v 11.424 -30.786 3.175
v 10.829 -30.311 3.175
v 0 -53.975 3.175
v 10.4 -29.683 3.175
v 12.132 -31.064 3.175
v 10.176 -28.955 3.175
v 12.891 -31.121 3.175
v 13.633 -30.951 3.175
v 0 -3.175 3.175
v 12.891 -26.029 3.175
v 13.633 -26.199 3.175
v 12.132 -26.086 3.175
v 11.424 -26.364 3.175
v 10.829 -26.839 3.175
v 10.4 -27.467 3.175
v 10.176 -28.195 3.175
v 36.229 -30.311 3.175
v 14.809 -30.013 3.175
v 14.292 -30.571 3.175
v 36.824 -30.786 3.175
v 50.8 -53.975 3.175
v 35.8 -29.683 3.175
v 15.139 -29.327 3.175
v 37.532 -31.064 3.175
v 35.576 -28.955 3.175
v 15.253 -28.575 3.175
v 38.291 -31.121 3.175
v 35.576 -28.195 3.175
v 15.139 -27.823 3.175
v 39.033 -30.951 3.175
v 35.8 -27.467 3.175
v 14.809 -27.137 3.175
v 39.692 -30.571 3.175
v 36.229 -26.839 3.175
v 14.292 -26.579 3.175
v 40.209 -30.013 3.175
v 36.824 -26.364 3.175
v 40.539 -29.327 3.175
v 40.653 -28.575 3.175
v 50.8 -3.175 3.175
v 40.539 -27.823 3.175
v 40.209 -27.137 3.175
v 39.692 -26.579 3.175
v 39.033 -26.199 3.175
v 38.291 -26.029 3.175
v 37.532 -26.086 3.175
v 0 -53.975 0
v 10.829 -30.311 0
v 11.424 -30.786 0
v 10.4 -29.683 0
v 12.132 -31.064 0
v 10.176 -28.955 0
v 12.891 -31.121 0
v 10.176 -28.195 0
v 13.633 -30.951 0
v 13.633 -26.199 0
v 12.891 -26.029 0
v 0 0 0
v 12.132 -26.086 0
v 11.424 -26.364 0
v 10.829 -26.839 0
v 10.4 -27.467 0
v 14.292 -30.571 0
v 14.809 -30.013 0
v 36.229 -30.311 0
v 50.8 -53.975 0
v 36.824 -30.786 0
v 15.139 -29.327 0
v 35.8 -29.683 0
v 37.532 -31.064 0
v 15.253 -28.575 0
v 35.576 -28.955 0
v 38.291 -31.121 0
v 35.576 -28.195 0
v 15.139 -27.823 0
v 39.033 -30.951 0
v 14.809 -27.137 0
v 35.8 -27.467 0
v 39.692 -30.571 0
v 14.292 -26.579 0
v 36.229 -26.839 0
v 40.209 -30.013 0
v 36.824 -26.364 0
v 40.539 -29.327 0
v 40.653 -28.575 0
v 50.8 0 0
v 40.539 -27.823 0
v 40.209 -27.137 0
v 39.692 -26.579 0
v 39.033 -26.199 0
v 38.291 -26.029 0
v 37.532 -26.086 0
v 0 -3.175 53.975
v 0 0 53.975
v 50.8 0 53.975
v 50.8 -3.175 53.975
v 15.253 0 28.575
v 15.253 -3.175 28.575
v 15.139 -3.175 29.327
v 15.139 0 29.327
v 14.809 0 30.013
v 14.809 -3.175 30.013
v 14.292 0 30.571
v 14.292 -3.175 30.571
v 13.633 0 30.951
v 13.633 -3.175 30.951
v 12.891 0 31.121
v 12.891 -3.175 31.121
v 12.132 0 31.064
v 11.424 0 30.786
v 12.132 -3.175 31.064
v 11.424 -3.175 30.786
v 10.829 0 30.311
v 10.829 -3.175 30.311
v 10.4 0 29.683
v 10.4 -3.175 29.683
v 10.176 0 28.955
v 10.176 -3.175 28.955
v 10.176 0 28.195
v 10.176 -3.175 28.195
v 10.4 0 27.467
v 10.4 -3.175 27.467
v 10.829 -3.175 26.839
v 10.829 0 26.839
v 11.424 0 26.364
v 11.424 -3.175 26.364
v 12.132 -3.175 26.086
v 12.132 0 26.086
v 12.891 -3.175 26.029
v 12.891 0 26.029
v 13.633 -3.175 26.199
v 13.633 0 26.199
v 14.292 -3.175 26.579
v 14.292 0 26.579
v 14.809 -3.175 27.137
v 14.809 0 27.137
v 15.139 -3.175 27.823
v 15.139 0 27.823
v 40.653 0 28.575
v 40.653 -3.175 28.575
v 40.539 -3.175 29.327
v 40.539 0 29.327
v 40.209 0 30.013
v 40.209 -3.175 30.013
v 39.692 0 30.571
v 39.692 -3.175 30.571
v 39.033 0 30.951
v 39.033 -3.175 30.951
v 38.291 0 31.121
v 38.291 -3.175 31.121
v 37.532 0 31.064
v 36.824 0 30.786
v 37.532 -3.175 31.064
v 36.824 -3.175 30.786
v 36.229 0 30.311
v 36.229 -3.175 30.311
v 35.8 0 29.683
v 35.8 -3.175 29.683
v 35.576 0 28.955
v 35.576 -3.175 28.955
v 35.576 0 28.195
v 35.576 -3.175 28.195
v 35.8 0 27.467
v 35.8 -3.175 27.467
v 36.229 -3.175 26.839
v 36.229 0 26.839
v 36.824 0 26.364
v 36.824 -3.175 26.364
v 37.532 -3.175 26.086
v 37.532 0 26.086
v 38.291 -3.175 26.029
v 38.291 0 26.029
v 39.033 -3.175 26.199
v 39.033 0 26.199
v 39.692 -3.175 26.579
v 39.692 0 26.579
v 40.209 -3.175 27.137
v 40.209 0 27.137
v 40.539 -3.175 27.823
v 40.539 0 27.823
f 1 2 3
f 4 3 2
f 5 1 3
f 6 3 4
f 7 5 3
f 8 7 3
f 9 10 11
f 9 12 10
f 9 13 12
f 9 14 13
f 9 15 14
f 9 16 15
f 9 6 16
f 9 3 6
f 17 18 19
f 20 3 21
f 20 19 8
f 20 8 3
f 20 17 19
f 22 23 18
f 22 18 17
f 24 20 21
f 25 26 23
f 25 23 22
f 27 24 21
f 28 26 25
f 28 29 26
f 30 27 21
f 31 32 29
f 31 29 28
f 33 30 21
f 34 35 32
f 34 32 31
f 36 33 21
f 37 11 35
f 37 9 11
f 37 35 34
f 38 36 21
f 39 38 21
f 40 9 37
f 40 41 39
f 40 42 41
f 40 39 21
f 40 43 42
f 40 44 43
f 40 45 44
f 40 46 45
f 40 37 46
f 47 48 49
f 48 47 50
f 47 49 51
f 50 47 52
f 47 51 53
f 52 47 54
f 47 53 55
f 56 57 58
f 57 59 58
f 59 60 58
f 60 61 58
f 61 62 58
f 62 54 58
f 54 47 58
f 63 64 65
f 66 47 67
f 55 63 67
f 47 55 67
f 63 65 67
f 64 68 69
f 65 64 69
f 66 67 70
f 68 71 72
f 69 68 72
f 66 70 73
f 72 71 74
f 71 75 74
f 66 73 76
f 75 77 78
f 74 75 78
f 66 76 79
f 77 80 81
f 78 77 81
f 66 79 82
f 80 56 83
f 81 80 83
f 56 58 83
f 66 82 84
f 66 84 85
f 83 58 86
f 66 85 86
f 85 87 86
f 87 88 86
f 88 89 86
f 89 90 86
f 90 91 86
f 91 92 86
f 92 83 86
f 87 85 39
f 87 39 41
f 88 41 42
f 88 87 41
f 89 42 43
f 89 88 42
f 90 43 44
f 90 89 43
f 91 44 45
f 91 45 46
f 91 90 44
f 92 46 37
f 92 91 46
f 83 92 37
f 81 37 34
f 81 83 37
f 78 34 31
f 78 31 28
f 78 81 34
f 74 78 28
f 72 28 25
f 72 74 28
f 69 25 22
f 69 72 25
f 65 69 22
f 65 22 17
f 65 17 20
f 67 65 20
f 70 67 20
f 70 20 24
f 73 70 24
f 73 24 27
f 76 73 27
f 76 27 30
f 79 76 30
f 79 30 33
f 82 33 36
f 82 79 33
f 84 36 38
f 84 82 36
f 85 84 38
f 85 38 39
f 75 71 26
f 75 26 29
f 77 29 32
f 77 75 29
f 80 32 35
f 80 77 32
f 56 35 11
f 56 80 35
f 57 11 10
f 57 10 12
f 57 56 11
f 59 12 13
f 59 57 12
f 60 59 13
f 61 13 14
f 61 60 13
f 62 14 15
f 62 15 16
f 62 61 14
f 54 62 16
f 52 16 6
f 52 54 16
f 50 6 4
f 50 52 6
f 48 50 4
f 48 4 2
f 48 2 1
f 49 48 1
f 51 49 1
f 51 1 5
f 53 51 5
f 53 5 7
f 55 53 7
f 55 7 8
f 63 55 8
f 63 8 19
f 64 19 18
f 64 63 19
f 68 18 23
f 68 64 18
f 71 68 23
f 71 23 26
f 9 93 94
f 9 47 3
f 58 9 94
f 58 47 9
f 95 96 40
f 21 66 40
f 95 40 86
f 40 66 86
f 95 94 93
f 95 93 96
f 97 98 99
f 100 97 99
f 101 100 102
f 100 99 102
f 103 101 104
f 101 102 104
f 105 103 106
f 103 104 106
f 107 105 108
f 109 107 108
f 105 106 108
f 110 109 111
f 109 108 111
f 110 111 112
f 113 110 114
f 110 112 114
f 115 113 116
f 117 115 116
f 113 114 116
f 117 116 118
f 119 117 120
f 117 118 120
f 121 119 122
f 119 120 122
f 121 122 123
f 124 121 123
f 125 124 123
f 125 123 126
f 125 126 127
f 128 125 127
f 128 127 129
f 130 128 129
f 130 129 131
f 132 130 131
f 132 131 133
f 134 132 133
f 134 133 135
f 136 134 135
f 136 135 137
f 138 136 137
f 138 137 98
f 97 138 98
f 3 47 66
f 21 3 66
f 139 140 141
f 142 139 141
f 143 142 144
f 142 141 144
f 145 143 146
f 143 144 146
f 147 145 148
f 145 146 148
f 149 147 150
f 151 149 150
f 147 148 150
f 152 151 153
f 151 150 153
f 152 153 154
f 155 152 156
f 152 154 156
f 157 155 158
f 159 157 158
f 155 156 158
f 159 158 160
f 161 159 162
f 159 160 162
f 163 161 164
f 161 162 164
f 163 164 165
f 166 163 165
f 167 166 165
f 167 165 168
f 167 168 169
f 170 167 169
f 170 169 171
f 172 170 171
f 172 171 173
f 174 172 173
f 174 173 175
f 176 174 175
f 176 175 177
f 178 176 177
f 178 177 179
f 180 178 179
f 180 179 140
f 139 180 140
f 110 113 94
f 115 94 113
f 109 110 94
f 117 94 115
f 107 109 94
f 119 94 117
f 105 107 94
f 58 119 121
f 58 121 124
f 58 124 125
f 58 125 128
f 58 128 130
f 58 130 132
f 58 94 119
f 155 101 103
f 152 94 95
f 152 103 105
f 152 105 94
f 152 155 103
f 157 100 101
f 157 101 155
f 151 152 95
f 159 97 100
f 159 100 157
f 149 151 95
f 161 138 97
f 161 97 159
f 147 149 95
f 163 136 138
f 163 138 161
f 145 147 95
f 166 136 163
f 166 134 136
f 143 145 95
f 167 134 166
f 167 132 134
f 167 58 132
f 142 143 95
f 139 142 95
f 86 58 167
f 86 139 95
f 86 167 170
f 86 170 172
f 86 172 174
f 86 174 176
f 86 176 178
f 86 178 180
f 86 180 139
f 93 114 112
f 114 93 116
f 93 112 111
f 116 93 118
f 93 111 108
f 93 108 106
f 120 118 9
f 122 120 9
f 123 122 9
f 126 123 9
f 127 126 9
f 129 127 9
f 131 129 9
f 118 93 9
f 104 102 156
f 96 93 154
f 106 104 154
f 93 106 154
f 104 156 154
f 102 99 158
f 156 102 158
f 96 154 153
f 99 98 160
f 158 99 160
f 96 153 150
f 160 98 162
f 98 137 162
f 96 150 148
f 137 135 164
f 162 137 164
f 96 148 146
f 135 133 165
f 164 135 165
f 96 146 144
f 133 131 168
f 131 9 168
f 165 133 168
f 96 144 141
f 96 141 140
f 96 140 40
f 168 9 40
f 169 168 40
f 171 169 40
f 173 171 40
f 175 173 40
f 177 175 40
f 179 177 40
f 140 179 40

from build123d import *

# Parameters (mm, degrees)
F0_W     = 50.8
F0_H     = 53.975
F0_R     = 2.5527
F1_DEPTH = 3.175
F2_W     = 50.8
F2_H     = 3.175
F3_DEPTH = 50.8
F4_R     = 2.5527
F5_DEPTH = 25.4


with BuildPart() as f1:
    # F0 (on Top) → F1 (new body)
    with BuildSketch(Plane.XY):
        with Locations((25.4, -26.9875)):
            Rectangle(F0_W, F0_H)
        with Locations((12.7, -28.575)):
            Circle(F0_R, mode=Mode.SUBTRACT)
        with Locations((38.1, -28.575)):
            Circle(F0_R, mode=Mode.SUBTRACT)
    extrude(amount=F1_DEPTH)

    # F2 (on face) → F3 (join)
    with BuildSketch(Plane.XY.offset(3.175)):
        with Locations((25.4, -1.5875)):
            Rectangle(F2_W, F2_H)
    extrude(amount=F3_DEPTH)

    # F4 (on face) → F5 (cut)
    with BuildSketch(Plane.XZ.offset(3.175)):
        with Locations((12.7, 28.575)):
            Circle(F4_R)
        with Locations((38.1, 28.575)):
            Circle(F4_R)
    extrude(amount=-F5_DEPTH, mode=Mode.SUBTRACT)


solid = f1.part
